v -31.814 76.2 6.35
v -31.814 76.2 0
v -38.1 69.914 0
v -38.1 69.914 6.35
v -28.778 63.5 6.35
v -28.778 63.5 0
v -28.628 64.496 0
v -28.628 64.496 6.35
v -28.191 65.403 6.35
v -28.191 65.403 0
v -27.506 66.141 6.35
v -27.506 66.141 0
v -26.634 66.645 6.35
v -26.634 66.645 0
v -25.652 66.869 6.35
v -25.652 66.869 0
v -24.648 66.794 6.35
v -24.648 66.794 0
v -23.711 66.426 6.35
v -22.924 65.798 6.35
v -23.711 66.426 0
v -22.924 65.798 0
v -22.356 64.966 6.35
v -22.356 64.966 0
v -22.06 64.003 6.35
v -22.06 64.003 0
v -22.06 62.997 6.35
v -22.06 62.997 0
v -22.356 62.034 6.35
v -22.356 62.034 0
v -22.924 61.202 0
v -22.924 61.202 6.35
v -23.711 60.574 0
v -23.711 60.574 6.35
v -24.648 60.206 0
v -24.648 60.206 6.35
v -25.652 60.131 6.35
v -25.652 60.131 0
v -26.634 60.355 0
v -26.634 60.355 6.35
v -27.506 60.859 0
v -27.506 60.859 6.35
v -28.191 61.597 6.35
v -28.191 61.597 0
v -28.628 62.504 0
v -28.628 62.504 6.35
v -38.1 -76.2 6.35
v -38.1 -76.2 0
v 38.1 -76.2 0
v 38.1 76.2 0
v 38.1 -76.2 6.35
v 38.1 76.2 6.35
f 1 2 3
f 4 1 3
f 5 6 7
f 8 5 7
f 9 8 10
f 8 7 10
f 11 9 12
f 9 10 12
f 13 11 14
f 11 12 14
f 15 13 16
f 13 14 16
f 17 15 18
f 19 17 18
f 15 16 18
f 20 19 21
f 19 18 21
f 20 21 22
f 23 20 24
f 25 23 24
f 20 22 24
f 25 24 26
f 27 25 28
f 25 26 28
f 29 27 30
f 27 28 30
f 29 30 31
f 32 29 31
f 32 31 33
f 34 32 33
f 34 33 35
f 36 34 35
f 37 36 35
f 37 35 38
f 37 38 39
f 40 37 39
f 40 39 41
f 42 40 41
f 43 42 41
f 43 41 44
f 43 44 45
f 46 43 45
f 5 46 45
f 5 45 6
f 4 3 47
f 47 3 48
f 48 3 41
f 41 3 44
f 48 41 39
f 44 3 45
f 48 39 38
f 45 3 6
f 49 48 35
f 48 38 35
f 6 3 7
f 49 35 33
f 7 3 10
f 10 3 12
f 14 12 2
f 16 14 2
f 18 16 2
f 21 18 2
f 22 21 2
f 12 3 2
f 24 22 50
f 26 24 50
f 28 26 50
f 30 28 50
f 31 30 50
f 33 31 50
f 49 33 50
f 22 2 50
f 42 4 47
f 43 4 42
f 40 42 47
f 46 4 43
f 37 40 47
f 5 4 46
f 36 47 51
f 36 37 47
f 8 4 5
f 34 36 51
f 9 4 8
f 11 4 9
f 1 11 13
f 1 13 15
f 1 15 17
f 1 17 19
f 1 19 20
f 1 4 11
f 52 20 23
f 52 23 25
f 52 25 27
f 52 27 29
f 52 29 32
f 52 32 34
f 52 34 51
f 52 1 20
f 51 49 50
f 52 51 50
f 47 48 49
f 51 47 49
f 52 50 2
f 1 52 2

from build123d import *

# Parameters (mm, degrees)
F1_DEPTH = 6.35
F3_D     = 6.7564


with BuildPart() as f1:
    # F0 (on Top) → F1 (new body)
    with BuildSketch(Plane.XY):
        Polygon((38.1, 76.2), (-31.8138207153, 76.2), (-38.1, 69.9138207153), (-38.1, -76.2), (38.1, -76.2), align=None)
    extrude(amount=F1_DEPTH)

    # F3 (through all)
    with Locations(Plane.XY.offset(6.35)):
        with Locations((-25.4, 63.5)):
            Hole(F3_D / 2)


solid = f1.part
